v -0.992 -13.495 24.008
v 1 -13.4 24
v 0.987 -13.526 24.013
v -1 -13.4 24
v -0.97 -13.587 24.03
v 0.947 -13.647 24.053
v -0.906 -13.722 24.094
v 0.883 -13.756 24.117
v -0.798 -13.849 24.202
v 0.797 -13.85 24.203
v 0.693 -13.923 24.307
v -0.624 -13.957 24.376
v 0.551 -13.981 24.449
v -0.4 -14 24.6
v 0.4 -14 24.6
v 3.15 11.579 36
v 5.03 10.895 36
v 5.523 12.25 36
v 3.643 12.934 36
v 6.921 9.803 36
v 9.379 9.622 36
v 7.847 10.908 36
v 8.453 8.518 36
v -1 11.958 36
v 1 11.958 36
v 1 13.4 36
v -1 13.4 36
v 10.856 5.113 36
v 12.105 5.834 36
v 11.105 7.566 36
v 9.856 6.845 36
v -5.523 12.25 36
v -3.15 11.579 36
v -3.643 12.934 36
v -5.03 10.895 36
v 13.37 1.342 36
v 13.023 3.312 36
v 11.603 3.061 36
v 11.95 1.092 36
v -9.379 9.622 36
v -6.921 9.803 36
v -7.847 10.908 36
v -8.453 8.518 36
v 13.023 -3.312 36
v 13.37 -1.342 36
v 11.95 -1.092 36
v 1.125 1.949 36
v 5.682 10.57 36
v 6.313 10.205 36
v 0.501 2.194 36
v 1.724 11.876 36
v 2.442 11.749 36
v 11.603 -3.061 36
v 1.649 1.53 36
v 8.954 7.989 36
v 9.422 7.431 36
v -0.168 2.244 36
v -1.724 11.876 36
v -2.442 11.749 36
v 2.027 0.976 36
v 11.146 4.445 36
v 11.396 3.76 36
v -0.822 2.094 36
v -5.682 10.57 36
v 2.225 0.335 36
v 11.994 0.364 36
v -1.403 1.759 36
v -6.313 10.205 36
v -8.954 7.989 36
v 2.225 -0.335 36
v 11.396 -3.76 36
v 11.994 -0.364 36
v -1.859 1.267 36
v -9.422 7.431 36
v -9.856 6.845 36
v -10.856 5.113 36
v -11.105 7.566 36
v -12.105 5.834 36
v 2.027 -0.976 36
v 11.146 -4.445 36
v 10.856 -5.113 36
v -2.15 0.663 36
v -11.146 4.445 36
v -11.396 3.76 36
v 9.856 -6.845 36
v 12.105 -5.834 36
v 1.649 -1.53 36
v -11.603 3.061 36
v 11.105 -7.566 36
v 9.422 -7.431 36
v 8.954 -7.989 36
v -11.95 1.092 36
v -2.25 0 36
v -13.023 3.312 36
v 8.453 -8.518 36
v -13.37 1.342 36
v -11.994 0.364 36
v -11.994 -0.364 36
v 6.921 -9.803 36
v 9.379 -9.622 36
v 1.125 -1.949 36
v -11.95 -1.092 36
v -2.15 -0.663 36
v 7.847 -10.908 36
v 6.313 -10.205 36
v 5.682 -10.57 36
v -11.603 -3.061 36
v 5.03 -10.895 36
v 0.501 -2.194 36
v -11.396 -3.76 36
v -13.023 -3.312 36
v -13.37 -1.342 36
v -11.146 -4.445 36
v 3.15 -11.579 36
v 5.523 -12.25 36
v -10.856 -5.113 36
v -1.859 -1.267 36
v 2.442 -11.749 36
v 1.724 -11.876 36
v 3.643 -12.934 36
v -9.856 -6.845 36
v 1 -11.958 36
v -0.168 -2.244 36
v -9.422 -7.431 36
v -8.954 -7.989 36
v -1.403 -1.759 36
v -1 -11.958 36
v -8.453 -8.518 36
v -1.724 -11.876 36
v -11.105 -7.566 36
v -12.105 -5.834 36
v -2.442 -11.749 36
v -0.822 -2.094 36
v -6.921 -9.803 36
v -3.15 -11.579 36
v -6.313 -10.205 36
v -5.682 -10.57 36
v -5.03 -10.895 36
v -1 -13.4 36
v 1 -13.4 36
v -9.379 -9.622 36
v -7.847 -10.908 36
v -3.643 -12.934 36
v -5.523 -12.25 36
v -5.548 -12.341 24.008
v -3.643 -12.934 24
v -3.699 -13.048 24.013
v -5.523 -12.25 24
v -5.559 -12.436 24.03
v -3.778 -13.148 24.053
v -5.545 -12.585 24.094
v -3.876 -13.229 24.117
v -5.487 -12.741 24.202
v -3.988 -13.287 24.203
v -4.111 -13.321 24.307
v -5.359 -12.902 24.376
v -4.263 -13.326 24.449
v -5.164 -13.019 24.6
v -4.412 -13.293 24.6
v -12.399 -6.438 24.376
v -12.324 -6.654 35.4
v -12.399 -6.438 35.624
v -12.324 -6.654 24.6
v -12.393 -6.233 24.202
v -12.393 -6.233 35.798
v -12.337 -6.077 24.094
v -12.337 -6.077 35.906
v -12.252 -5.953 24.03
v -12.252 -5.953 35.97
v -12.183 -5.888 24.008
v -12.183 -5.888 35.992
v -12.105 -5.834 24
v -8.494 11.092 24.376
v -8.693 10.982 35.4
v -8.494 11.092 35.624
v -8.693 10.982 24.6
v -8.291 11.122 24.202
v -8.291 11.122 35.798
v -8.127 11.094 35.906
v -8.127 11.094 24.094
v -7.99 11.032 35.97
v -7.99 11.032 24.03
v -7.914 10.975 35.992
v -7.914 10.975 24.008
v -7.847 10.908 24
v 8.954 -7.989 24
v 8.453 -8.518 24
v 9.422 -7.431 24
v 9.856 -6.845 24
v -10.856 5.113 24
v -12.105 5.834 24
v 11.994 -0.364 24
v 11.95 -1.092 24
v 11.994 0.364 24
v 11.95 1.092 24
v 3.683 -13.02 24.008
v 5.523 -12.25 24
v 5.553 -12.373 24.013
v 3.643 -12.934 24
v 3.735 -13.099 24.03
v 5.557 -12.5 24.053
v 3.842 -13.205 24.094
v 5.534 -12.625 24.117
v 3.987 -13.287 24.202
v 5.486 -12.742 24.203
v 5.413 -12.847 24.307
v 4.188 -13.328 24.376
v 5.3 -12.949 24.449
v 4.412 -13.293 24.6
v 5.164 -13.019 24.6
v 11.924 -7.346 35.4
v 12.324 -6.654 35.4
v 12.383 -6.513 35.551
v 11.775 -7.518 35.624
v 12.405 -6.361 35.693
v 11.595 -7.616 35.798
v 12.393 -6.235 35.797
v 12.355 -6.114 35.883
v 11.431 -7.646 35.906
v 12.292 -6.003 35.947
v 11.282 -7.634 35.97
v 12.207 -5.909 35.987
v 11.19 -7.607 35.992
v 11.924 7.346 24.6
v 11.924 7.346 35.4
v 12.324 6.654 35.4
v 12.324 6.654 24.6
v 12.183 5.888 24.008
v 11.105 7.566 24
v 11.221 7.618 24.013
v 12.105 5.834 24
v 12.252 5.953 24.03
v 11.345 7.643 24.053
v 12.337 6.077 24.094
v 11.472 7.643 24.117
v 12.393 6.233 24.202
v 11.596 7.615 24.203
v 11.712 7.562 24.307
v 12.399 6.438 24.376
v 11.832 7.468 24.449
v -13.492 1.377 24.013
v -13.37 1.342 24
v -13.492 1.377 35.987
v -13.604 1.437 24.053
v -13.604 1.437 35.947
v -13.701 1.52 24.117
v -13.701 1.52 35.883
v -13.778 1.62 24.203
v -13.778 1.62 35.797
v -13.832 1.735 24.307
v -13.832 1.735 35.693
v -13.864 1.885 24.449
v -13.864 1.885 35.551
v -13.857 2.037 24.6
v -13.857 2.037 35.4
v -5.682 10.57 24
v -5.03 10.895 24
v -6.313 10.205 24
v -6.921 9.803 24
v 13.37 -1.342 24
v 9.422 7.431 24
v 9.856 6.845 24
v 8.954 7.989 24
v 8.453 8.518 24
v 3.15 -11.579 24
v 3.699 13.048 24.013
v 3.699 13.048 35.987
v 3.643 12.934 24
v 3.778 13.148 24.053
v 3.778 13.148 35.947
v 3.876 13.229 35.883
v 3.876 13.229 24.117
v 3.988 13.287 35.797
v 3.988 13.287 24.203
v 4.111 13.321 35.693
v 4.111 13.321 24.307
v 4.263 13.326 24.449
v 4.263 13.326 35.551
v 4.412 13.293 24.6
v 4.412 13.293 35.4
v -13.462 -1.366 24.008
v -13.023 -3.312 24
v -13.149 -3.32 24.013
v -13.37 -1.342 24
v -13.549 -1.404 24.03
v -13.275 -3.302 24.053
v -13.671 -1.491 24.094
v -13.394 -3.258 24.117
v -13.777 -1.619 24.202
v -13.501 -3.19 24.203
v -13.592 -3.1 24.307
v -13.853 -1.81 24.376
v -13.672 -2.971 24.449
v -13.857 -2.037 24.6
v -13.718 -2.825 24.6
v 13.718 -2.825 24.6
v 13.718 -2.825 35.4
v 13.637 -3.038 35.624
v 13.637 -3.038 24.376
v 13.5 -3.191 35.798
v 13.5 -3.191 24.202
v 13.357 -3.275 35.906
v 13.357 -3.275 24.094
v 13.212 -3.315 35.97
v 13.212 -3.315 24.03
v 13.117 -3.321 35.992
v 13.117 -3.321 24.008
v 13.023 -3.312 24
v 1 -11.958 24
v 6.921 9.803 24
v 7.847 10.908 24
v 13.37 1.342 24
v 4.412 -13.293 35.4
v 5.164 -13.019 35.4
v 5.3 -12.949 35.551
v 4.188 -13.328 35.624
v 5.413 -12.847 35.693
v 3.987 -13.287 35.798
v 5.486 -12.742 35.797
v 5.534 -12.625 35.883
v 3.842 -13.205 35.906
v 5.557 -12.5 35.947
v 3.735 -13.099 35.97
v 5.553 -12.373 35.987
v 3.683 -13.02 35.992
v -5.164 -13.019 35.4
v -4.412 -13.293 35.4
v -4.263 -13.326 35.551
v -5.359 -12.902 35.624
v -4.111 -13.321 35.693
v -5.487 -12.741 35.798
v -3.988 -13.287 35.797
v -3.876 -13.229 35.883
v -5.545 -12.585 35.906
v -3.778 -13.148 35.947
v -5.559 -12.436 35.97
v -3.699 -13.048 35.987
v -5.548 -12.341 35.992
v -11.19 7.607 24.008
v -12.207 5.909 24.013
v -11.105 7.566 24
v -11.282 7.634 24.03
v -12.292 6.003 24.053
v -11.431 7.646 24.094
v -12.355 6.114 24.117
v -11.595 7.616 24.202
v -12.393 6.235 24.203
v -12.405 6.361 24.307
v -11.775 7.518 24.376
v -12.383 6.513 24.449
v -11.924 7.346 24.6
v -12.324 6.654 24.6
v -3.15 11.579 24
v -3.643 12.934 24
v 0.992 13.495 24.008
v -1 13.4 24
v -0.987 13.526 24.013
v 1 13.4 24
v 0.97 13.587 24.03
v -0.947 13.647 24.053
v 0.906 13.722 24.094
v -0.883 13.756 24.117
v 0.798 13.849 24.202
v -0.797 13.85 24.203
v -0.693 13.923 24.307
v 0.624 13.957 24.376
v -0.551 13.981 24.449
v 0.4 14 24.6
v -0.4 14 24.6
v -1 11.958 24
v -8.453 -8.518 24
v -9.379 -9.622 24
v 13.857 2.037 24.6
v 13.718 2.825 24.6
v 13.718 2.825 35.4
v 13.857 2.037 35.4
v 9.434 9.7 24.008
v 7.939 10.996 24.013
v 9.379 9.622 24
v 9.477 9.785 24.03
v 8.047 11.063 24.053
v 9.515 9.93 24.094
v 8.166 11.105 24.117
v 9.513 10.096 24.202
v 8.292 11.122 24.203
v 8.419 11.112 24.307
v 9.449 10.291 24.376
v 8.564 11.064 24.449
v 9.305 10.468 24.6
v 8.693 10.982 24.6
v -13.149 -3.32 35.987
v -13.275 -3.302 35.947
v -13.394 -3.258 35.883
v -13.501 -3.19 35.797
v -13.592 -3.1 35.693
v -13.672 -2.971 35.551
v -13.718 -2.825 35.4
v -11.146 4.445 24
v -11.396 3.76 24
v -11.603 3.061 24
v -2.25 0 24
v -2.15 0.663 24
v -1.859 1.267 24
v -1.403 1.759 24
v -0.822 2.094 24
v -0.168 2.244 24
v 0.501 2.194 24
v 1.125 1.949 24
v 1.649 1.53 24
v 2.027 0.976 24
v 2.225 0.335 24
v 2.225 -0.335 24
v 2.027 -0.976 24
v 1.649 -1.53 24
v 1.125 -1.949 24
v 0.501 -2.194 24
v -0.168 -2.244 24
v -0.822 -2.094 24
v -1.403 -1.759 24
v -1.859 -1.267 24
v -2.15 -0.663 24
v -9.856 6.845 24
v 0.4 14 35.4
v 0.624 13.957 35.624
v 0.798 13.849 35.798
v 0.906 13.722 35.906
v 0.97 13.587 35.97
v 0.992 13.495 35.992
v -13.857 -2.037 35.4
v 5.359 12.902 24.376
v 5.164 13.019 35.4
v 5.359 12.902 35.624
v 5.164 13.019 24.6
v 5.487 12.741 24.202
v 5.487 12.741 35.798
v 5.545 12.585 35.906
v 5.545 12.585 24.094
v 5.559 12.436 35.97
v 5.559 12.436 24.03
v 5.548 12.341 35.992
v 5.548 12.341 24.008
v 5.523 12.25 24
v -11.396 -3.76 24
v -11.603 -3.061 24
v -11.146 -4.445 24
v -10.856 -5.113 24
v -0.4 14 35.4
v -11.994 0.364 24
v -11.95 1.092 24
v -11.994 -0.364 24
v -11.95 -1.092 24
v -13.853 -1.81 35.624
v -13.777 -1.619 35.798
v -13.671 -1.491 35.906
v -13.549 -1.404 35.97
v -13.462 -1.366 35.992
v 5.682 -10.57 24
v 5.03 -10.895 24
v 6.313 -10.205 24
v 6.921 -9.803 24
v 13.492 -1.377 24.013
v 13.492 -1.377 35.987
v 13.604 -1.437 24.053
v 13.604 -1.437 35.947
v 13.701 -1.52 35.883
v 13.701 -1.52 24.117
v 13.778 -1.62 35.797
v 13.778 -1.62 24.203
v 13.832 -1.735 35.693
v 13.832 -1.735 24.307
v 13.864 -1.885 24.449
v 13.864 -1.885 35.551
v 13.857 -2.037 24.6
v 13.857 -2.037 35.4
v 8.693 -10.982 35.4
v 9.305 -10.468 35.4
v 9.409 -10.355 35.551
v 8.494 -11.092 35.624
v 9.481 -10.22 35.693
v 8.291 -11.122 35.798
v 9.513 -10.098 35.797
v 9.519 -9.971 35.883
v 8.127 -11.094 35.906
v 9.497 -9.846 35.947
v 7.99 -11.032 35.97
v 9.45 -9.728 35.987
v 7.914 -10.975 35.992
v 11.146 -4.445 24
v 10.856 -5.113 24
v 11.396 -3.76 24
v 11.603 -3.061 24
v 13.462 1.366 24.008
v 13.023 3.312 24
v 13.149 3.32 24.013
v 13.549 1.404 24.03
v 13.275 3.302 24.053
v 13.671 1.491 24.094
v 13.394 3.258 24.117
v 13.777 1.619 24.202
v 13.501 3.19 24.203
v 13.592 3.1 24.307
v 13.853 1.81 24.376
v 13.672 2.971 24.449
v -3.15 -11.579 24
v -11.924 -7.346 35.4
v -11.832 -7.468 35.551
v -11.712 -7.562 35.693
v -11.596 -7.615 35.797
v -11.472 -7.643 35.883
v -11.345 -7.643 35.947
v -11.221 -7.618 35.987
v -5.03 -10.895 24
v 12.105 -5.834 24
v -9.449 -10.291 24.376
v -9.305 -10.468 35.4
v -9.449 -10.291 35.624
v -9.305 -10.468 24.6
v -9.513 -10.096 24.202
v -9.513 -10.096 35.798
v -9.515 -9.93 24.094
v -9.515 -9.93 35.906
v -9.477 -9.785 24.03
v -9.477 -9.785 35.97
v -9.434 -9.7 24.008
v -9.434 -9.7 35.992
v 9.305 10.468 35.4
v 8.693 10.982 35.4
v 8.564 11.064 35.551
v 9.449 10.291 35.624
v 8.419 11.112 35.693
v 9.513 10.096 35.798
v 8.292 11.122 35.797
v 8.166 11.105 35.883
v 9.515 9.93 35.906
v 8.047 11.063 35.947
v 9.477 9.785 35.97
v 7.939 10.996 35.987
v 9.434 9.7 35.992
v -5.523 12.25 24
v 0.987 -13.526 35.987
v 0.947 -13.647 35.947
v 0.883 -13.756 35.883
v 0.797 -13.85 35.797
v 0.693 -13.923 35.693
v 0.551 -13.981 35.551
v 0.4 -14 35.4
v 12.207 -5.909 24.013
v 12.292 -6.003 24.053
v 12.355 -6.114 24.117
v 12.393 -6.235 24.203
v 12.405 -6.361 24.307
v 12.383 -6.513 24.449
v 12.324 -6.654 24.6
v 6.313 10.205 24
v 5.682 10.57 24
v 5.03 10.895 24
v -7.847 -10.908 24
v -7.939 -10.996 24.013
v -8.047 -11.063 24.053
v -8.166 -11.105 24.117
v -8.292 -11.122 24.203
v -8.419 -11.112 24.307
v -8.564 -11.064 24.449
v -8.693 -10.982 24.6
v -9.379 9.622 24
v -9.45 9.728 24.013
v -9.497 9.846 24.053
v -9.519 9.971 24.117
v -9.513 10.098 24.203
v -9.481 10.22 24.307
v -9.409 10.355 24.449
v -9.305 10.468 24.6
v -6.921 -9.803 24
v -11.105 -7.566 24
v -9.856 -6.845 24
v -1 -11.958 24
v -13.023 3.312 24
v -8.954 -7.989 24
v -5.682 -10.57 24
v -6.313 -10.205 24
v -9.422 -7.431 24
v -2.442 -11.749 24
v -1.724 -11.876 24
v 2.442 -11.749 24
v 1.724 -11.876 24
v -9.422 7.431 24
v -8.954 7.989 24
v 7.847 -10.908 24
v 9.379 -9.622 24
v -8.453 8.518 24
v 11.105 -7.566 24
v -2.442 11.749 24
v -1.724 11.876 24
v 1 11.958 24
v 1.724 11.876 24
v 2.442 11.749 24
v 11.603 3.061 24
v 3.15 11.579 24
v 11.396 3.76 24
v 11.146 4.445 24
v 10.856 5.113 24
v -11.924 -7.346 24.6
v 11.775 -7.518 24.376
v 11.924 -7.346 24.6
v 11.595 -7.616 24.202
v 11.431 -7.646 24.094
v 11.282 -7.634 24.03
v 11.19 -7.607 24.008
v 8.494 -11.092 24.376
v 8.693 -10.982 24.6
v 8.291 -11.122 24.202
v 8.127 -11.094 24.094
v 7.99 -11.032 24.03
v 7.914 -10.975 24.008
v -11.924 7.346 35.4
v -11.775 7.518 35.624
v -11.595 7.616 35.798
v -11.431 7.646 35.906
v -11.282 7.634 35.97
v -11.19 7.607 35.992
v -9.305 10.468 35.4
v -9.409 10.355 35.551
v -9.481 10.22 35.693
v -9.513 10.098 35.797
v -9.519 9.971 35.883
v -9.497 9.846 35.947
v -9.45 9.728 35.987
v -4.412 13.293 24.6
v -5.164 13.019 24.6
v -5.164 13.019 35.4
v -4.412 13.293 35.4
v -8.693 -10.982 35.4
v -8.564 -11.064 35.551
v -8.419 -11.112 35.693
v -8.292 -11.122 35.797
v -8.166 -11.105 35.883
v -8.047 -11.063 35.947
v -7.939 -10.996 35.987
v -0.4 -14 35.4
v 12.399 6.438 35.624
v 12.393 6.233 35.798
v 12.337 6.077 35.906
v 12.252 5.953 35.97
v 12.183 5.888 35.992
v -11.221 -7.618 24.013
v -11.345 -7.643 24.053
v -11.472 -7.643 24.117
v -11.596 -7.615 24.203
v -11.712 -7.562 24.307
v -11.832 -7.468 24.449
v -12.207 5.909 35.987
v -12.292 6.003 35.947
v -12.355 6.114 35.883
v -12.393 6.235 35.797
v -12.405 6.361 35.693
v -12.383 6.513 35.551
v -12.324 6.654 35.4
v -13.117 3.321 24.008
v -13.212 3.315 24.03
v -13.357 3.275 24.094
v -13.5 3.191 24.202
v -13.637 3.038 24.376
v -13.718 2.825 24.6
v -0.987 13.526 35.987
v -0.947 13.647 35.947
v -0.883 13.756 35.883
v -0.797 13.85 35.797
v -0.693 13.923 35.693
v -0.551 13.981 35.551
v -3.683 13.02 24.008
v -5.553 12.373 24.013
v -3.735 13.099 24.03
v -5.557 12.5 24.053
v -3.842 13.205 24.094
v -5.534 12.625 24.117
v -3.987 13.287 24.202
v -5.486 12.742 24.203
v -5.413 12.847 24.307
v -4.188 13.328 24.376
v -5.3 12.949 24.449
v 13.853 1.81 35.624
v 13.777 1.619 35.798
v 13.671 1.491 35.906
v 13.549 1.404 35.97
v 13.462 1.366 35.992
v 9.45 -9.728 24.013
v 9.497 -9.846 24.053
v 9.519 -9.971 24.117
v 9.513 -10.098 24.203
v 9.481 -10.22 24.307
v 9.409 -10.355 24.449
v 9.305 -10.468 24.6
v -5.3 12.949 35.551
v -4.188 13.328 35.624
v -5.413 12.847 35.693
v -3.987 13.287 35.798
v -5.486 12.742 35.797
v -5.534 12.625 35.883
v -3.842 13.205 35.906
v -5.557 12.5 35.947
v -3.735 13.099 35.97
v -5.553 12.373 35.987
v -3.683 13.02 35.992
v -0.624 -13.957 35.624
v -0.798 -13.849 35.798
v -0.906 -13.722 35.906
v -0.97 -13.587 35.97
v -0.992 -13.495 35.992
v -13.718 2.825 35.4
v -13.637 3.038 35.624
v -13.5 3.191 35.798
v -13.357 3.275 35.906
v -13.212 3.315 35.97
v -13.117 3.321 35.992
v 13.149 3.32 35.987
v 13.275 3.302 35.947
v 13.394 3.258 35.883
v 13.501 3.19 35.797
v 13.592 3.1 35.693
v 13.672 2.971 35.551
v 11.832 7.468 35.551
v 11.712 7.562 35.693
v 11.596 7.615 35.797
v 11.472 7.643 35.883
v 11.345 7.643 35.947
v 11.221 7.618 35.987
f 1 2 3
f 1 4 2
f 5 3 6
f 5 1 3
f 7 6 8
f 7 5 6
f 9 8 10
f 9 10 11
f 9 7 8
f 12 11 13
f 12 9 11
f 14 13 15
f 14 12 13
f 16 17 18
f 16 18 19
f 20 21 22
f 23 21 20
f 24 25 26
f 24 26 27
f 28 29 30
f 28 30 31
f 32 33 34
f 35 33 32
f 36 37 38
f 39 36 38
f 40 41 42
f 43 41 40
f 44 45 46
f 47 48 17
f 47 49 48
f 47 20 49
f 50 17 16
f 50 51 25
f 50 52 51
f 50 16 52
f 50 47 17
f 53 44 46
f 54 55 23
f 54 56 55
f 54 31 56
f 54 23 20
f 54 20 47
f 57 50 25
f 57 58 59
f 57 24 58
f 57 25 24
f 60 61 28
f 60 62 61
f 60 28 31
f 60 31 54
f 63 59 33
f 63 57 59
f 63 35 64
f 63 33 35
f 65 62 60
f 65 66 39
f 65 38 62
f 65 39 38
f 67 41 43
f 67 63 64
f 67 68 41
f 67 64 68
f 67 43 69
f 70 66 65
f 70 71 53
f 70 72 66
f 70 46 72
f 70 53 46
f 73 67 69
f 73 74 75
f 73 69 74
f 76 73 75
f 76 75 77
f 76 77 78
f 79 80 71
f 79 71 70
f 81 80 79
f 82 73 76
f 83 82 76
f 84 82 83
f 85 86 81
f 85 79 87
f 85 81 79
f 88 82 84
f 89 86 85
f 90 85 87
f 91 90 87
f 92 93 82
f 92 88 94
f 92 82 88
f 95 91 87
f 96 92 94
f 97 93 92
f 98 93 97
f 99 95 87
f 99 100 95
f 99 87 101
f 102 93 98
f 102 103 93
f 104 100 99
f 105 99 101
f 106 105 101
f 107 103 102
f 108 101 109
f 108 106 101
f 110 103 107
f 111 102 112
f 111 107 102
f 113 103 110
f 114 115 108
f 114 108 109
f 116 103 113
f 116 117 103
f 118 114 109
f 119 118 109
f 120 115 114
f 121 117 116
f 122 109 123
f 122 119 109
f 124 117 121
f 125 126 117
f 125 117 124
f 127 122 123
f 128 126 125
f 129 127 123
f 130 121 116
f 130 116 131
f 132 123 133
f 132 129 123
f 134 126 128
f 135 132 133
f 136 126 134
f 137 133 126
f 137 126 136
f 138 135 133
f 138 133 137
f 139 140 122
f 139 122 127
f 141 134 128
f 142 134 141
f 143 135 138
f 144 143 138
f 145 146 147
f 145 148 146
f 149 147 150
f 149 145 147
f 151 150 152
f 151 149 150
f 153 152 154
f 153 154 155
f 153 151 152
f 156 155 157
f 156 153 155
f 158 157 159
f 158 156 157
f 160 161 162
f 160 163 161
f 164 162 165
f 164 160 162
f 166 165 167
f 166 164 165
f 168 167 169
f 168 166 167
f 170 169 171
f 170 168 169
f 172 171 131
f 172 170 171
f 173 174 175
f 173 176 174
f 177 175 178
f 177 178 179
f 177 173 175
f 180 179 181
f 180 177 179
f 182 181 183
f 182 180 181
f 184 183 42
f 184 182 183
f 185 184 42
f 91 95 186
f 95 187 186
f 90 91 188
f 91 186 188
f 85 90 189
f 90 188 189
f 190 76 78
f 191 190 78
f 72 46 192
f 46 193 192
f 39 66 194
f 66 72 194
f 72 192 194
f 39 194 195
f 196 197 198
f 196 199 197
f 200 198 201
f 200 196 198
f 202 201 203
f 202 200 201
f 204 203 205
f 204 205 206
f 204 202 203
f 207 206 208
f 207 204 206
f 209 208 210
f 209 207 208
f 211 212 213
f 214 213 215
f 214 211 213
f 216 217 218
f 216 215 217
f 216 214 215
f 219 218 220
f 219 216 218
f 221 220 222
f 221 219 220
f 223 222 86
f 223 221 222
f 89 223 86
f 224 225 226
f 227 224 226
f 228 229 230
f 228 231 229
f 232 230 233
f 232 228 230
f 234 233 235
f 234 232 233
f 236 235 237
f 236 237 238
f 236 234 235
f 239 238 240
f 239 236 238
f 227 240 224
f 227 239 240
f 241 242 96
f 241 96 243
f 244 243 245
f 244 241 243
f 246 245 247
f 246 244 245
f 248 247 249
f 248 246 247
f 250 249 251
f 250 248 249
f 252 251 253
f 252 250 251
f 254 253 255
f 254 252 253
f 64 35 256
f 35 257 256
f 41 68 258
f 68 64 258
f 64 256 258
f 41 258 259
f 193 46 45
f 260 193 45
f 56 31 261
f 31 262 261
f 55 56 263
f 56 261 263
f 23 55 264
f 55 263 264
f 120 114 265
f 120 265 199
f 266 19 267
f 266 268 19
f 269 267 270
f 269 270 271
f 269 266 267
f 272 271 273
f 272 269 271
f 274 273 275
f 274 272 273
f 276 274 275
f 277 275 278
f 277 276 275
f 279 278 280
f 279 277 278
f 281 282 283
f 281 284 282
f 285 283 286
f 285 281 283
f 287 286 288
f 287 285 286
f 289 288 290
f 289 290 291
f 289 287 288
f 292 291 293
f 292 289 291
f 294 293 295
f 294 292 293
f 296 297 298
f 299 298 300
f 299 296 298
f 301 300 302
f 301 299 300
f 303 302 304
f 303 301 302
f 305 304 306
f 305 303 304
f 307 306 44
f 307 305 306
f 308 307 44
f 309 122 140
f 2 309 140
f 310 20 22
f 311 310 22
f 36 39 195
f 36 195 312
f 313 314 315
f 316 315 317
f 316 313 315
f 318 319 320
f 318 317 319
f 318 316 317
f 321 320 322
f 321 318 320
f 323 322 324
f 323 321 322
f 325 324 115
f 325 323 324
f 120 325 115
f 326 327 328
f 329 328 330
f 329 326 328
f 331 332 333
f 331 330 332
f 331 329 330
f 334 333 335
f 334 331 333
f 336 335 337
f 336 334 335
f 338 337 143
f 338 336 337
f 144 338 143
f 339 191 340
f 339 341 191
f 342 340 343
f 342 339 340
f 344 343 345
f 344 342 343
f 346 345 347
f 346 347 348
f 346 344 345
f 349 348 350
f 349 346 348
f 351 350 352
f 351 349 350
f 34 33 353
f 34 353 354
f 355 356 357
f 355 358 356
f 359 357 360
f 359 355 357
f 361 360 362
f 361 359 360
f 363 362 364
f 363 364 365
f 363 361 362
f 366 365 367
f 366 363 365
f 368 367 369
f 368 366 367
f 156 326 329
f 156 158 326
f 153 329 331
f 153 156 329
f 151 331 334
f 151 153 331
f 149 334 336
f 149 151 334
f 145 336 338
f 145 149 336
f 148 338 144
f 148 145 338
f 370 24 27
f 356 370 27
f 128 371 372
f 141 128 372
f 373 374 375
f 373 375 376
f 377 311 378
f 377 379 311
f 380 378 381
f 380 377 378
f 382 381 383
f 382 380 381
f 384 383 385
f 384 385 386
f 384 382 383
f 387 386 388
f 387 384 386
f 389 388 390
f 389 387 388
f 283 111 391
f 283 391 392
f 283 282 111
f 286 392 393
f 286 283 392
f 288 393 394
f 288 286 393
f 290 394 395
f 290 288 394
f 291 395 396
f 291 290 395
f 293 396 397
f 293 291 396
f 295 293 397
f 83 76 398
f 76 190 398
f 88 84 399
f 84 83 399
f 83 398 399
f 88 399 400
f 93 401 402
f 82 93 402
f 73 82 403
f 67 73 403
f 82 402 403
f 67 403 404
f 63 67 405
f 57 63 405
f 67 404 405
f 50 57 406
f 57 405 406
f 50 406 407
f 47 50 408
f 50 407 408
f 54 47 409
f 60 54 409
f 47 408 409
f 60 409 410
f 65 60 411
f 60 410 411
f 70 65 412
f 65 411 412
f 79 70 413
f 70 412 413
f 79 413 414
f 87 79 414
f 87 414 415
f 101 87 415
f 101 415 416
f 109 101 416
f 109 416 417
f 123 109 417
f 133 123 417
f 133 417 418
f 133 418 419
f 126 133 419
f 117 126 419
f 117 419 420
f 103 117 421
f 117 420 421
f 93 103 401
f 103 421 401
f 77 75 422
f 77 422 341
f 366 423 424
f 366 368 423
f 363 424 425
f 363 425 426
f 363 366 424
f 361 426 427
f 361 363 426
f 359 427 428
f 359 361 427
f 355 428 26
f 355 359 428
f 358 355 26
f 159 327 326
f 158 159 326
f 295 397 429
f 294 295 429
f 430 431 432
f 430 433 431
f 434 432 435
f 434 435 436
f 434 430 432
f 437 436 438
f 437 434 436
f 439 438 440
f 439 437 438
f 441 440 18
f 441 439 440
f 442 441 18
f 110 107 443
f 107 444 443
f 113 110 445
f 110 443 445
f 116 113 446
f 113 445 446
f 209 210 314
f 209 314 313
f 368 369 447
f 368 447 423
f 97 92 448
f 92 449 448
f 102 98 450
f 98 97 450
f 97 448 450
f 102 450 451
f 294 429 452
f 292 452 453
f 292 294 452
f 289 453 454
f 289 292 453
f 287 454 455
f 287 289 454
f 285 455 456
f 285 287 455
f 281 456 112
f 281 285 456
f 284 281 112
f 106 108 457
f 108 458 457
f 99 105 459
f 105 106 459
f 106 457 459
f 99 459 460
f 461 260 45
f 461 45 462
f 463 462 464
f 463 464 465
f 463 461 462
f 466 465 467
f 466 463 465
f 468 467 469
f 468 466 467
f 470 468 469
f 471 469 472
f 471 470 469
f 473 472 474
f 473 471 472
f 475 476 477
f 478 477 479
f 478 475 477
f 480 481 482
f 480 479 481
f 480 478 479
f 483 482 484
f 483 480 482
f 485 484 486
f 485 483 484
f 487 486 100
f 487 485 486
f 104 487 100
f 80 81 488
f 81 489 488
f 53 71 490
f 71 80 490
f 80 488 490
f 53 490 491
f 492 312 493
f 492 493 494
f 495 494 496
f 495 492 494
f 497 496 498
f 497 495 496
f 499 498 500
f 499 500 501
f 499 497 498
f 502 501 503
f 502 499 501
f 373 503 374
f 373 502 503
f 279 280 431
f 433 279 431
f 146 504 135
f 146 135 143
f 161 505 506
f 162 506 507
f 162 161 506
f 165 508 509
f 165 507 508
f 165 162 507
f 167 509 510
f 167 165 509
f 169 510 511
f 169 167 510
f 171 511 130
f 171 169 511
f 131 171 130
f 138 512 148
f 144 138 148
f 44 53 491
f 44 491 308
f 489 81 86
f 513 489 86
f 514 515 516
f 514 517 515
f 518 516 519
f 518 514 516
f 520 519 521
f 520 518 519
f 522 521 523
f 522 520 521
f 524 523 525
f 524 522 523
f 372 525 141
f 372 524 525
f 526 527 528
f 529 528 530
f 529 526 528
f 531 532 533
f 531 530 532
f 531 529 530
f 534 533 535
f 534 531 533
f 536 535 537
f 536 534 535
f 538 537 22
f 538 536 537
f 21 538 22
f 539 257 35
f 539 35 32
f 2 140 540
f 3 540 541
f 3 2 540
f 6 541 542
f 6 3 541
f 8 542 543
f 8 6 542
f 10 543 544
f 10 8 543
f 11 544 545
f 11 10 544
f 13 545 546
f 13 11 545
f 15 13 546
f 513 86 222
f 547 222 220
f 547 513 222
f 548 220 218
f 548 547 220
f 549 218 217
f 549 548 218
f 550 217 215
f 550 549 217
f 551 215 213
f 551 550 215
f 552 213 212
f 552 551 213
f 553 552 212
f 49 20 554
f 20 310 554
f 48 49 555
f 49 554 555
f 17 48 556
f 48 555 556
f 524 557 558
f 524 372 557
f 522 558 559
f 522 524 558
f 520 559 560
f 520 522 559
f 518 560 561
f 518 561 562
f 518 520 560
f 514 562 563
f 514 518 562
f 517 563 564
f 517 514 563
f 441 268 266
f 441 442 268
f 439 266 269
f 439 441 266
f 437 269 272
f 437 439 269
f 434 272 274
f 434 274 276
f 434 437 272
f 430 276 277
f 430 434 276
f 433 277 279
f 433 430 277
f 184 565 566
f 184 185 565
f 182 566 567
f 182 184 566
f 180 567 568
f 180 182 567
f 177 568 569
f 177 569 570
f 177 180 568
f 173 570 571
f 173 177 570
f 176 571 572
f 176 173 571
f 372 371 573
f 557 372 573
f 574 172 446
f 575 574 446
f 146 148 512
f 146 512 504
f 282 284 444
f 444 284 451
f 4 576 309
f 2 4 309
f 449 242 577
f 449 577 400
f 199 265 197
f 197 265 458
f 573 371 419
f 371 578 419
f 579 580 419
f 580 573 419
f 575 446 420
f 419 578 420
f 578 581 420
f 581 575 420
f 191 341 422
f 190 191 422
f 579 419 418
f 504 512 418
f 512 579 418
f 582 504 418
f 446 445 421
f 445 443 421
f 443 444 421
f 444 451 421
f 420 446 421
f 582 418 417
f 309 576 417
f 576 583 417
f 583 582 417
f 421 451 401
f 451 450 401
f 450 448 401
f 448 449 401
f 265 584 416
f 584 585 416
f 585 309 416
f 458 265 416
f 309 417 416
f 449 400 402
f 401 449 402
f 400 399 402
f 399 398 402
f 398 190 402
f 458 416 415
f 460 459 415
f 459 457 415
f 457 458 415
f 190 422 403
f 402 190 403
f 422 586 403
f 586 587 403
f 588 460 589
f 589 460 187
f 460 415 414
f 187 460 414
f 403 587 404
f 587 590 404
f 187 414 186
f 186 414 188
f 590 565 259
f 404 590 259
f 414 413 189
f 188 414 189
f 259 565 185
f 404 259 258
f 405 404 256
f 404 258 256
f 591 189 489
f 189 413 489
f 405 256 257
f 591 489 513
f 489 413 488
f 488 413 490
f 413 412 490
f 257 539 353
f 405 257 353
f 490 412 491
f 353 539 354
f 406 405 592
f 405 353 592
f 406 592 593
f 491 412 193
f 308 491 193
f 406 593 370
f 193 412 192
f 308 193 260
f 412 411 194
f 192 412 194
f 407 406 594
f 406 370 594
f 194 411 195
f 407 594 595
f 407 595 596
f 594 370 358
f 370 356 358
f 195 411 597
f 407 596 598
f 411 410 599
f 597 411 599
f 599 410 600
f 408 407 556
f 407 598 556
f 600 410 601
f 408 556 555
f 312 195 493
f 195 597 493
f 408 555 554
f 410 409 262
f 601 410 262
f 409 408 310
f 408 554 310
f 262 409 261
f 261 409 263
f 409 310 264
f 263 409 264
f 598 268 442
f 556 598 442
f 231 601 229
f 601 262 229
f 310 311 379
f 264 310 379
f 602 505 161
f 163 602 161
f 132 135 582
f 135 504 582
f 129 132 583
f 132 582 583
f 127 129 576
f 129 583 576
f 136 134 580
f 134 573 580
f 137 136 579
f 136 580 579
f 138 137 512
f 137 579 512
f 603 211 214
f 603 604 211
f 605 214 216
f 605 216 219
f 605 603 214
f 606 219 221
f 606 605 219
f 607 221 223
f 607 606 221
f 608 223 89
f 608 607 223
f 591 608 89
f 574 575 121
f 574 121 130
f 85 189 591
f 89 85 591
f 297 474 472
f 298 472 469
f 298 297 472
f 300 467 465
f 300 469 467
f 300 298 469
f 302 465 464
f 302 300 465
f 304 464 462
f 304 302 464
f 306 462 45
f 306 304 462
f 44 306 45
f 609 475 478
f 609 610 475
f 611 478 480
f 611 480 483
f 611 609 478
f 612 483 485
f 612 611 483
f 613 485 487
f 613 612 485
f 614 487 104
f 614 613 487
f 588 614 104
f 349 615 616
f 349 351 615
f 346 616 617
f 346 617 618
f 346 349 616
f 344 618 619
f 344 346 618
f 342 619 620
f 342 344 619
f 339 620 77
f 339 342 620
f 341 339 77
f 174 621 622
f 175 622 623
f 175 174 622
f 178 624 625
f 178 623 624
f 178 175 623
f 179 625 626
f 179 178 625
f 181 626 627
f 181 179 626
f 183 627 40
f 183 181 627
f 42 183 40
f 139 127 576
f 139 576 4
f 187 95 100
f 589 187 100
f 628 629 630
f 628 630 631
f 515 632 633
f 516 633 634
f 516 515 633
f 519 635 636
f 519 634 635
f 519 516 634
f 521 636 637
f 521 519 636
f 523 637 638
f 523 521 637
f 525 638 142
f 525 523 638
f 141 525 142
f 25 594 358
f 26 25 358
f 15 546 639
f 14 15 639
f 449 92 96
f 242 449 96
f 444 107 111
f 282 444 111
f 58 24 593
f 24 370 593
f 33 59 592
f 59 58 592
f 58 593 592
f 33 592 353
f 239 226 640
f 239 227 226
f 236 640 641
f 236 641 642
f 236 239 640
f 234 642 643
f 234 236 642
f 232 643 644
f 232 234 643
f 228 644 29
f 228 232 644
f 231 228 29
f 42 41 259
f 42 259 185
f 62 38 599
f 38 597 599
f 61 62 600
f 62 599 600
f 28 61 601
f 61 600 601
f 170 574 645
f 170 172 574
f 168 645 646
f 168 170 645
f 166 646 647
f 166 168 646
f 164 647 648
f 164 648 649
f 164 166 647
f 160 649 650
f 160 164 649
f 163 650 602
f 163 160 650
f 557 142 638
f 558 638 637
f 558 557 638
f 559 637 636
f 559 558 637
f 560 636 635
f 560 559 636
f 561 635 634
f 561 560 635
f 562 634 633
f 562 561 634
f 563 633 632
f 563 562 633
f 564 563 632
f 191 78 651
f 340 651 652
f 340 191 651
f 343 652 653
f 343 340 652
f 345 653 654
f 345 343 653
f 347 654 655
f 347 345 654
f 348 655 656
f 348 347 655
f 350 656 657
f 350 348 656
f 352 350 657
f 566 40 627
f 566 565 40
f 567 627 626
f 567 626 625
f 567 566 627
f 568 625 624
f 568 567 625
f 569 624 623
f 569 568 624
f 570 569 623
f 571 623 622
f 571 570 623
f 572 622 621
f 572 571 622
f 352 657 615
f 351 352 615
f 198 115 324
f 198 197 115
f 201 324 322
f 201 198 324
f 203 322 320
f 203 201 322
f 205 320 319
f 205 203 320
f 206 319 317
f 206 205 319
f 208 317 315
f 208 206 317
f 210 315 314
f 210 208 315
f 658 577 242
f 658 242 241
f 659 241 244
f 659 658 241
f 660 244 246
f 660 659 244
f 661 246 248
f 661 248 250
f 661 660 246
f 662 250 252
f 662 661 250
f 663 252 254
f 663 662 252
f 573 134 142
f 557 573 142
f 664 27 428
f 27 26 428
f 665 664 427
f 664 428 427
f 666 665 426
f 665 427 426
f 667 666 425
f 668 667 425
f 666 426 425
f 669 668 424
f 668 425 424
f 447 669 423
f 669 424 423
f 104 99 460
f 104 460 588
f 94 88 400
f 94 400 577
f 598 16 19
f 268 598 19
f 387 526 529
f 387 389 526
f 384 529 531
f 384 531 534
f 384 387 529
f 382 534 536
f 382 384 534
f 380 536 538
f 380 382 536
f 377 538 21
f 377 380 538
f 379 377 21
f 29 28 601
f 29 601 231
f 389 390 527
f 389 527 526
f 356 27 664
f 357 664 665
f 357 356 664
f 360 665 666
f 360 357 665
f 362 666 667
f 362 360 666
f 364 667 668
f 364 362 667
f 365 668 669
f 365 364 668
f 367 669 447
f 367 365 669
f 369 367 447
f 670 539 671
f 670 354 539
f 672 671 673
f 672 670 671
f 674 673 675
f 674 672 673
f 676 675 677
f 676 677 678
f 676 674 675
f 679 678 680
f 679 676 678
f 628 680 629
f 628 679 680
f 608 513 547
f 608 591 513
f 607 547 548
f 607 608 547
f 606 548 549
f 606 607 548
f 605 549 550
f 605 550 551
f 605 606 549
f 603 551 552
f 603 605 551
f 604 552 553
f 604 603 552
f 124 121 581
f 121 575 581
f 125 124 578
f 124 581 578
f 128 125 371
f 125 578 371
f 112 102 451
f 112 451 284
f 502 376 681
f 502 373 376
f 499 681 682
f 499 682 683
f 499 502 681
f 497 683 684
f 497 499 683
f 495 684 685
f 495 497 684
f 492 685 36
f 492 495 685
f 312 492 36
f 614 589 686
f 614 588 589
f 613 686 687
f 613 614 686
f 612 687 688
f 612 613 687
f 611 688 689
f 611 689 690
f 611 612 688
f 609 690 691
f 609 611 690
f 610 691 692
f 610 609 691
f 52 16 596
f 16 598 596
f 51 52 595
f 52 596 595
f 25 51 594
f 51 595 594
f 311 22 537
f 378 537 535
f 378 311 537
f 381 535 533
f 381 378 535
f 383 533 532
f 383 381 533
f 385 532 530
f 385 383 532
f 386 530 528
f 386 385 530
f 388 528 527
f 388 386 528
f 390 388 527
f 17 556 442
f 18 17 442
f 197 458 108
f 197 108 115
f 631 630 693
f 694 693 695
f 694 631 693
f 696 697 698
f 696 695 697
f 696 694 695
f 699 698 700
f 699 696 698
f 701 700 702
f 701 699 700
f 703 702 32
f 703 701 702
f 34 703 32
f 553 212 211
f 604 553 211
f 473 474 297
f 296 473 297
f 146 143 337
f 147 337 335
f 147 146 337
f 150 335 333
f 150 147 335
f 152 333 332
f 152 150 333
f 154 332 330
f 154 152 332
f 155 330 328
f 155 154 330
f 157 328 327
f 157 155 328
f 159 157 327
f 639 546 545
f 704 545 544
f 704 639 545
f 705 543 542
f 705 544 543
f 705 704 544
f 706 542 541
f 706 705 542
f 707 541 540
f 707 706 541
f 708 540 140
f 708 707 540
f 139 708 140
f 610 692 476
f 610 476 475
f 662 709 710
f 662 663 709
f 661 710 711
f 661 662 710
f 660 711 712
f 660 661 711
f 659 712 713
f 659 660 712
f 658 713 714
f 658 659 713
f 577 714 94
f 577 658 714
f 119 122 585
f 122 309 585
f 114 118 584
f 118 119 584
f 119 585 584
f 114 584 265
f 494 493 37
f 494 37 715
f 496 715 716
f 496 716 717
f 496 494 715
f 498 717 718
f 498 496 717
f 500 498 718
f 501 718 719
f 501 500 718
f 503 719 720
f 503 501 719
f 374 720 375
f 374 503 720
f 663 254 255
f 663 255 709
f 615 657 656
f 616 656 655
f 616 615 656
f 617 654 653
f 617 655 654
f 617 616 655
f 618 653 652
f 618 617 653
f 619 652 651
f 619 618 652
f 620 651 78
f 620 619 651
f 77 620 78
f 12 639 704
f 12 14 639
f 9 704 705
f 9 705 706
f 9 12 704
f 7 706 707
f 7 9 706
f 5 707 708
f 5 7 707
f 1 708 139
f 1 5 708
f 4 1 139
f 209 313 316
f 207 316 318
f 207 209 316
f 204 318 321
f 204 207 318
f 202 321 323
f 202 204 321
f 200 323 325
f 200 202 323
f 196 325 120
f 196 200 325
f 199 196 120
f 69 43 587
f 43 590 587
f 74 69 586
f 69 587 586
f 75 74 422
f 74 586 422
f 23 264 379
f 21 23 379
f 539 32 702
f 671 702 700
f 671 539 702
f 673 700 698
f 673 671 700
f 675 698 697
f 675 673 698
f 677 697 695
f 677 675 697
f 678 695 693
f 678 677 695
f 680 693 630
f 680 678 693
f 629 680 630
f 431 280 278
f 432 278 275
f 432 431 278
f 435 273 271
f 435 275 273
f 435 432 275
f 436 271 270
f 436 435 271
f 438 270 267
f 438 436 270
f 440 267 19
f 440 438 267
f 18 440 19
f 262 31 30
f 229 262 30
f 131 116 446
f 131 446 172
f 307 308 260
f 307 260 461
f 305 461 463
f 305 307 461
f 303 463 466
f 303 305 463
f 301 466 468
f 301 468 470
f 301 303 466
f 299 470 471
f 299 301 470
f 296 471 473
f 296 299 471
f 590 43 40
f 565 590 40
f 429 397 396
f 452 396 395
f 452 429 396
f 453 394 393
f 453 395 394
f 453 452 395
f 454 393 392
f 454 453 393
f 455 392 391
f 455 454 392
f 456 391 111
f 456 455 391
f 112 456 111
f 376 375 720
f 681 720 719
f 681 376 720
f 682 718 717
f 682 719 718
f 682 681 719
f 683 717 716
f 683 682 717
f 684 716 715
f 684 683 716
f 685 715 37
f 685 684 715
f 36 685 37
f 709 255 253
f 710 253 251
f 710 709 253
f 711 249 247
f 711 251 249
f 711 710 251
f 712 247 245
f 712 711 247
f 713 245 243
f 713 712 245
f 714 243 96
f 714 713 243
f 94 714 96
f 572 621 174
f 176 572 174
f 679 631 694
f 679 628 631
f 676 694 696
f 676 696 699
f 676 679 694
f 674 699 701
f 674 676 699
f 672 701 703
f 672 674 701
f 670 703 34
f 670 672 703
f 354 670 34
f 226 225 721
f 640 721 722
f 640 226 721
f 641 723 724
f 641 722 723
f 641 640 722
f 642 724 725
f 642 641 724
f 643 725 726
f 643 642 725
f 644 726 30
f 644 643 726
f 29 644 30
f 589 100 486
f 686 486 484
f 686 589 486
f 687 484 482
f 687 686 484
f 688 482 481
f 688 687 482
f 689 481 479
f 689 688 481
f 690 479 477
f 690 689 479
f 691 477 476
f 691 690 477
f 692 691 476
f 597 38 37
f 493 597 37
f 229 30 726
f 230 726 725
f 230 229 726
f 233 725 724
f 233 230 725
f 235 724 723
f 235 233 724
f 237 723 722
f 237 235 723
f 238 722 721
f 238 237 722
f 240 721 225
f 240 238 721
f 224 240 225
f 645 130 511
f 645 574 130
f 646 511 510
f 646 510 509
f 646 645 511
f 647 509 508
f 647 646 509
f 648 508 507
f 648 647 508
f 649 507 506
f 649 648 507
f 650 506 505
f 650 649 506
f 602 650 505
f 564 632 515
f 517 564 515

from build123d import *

# Parameters (mm, degrees)
SKETCH2_R                = 60
BOSS_EXTRUDE1_DEPTH      = 60
SKETCH3_W                = 10
SKETCH3_H                = 10.47851478
BOSS_EXTRUDE2_DEPTH      = 60
FILLET2_R                = 3
CIRPATTERN1_COUNT        = 18
FILLET2_OF_CIRPATTERN1_R = 3
SKETCH4_R                = 10
CUT_EXTRUDE1_DEPTH       = 60
SKETCH5_R                = 11.25
CUT_EXTRUDE2_DEPTH       = 60
SCALE1_SCALE             = 0.2


with BuildPart() as part:
    # Sketch2 → Boss-Extrude1 (new body)
    with BuildSketch(Plane.XY):
        Circle(SKETCH2_R)
    extrude(amount=BOSS_EXTRUDE1_DEPTH)

    # Sketch3 → Boss-Extrude2 (add)
    with BuildSketch(Plane.XY.offset(60)):
        with Locations((0, 64.76074261)):
            Rectangle(SKETCH3_W, SKETCH3_H)
    boss_extrude2 = extrude(amount=-BOSS_EXTRUDE2_DEPTH)

    # Fillet2
    fillet2_edges = [part.edges().sort_by_distance(p)[0] for p in [
        (5, 70, 30),
        (0, 70, 0),
        (-5, 70, 30),
        (0, 70, 60),
    ]]
    fillet(fillet2_edges, radius=FILLET2_R)

    # CirPattern1: Boss-Extrude2 ×18 about axis
    cirpattern1_axis = Axis((0, 0, 0), (0, 0, 1))
    for i in range(1, CIRPATTERN1_COUNT):
        add(boss_extrude2.rotate(cirpattern1_axis, i * 360 / CIRPATTERN1_COUNT))

    # Fillet2 of CirPattern1
    fillet2_of_cirpattern1_edges = [part.edges().sort_by_distance(p)[0] for p in [
        (-19.242946929, 67.488584172, 30),
        (-23.941410033, 65.778483455, 0),
        (-28.639873137, 64.068382738, 30),
        (-23.941410033, 65.778483455, 60),
        (-41.164910462, 56.837049067, 30),
        (-44.995132678, 53.623111018, 0),
        (-48.825354894, 50.40917297, 30),
        (-44.995132678, 53.623111018, 60),
        (-58.121778265, 39.330127019, 30),
        (-60.621778265, 35, 0),
        (-63.121778265, 30.669872981, 30),
        (-60.621778265, 35, 60),
        (-68.068301823, 17.079411202, 30),
        (-68.936542711, 12.155372437, 0),
        (-69.804783599, 7.231333672, 30),
        (-68.936542711, 12.155372437, 60),
        (-69.804783599, -7.231333672, 30),
        (-68.936542711, -12.155372437, 0),
        (-68.068301823, -17.079411202, 30),
        (-68.936542711, -12.155372437, 60),
        (-63.121778265, -30.669872981, 30),
        (-60.621778265, -35, 0),
        (-58.121778265, -39.330127019, 30),
        (-60.621778265, -35, 60),
        (-48.825354894, -50.40917297, 30),
        (-44.995132678, -53.623111018, 0),
        (-41.164910462, -56.837049067, 30),
        (-44.995132678, -53.623111018, 60),
        (-28.639873137, -64.068382738, 30),
        (-23.941410033, -65.778483455, 0),
        (-19.242946929, -67.488584172, 30),
        (-23.941410033, -65.778483455, 60),
        (-5, -70, 30),
        (0, -70, 0),
        (5, -70, 30),
        (0, -70, 60),
        (19.242946929, -67.488584172, 30),
        (23.941410033, -65.778483455, 0),
        (28.639873137, -64.068382738, 30),
        (23.941410033, -65.778483455, 60),
        (41.164910462, -56.837049067, 30),
        (44.995132678, -53.623111018, 0),
        (48.825354894, -50.40917297, 30),
        (44.995132678, -53.623111018, 60),
        (58.121778265, -39.330127019, 30),
        (60.621778265, -35, 0),
        (63.121778265, -30.669872981, 30),
        (60.621778265, -35, 60),
        (68.068301823, -17.079411202, 30),
        (68.936542711, -12.155372437, 0),
        (69.804783599, -7.231333672, 30),
        (68.936542711, -12.155372437, 60),
        (69.804783599, 7.231333672, 30),
        (68.936542711, 12.155372437, 0),
        (68.068301823, 17.079411202, 30),
        (68.936542711, 12.155372437, 60),
        (63.121778265, 30.669872981, 30),
        (60.621778265, 35, 0),
        (58.121778265, 39.330127019, 30),
        (60.621778265, 35, 60),
        (48.825354894, 50.40917297, 30),
        (44.995132678, 53.623111018, 0),
        (41.164910462, 56.837049067, 30),
        (44.995132678, 53.623111018, 60),
        (28.639873137, 64.068382738, 30),
        (23.941410033, 65.778483455, 0),
        (19.242946929, 67.488584172, 30),
        (23.941410033, 65.778483455, 60),
    ]]
    fillet(fillet2_of_cirpattern1_edges, radius=FILLET2_OF_CIRPATTERN1_R)

    # Sketch4 → Cut-Extrude1 (cut)
    with BuildSketch(Plane.XY.offset(60)):
        Circle(SKETCH4_R)
    extrude(amount=-CUT_EXTRUDE1_DEPTH, mode=Mode.SUBTRACT)

    # Sketch5 → Cut-Extrude2 (cut)
    with BuildSketch(Plane(origin=(0, 0, 0), x_dir=(-1, 0, 0), z_dir=(0, 0, -1))):
        Circle(SKETCH5_R)
    extrude(amount=-CUT_EXTRUDE2_DEPTH, mode=Mode.SUBTRACT)


with BuildPart() as part_1:
    # Scale1: scaled about (3e-09, 1e-09, 29.999999969)
    add(part.part.scale(SCALE1_SCALE).moved(Location((2e-09, 1e-09, 23.999999975))))


solid = part_1.part
